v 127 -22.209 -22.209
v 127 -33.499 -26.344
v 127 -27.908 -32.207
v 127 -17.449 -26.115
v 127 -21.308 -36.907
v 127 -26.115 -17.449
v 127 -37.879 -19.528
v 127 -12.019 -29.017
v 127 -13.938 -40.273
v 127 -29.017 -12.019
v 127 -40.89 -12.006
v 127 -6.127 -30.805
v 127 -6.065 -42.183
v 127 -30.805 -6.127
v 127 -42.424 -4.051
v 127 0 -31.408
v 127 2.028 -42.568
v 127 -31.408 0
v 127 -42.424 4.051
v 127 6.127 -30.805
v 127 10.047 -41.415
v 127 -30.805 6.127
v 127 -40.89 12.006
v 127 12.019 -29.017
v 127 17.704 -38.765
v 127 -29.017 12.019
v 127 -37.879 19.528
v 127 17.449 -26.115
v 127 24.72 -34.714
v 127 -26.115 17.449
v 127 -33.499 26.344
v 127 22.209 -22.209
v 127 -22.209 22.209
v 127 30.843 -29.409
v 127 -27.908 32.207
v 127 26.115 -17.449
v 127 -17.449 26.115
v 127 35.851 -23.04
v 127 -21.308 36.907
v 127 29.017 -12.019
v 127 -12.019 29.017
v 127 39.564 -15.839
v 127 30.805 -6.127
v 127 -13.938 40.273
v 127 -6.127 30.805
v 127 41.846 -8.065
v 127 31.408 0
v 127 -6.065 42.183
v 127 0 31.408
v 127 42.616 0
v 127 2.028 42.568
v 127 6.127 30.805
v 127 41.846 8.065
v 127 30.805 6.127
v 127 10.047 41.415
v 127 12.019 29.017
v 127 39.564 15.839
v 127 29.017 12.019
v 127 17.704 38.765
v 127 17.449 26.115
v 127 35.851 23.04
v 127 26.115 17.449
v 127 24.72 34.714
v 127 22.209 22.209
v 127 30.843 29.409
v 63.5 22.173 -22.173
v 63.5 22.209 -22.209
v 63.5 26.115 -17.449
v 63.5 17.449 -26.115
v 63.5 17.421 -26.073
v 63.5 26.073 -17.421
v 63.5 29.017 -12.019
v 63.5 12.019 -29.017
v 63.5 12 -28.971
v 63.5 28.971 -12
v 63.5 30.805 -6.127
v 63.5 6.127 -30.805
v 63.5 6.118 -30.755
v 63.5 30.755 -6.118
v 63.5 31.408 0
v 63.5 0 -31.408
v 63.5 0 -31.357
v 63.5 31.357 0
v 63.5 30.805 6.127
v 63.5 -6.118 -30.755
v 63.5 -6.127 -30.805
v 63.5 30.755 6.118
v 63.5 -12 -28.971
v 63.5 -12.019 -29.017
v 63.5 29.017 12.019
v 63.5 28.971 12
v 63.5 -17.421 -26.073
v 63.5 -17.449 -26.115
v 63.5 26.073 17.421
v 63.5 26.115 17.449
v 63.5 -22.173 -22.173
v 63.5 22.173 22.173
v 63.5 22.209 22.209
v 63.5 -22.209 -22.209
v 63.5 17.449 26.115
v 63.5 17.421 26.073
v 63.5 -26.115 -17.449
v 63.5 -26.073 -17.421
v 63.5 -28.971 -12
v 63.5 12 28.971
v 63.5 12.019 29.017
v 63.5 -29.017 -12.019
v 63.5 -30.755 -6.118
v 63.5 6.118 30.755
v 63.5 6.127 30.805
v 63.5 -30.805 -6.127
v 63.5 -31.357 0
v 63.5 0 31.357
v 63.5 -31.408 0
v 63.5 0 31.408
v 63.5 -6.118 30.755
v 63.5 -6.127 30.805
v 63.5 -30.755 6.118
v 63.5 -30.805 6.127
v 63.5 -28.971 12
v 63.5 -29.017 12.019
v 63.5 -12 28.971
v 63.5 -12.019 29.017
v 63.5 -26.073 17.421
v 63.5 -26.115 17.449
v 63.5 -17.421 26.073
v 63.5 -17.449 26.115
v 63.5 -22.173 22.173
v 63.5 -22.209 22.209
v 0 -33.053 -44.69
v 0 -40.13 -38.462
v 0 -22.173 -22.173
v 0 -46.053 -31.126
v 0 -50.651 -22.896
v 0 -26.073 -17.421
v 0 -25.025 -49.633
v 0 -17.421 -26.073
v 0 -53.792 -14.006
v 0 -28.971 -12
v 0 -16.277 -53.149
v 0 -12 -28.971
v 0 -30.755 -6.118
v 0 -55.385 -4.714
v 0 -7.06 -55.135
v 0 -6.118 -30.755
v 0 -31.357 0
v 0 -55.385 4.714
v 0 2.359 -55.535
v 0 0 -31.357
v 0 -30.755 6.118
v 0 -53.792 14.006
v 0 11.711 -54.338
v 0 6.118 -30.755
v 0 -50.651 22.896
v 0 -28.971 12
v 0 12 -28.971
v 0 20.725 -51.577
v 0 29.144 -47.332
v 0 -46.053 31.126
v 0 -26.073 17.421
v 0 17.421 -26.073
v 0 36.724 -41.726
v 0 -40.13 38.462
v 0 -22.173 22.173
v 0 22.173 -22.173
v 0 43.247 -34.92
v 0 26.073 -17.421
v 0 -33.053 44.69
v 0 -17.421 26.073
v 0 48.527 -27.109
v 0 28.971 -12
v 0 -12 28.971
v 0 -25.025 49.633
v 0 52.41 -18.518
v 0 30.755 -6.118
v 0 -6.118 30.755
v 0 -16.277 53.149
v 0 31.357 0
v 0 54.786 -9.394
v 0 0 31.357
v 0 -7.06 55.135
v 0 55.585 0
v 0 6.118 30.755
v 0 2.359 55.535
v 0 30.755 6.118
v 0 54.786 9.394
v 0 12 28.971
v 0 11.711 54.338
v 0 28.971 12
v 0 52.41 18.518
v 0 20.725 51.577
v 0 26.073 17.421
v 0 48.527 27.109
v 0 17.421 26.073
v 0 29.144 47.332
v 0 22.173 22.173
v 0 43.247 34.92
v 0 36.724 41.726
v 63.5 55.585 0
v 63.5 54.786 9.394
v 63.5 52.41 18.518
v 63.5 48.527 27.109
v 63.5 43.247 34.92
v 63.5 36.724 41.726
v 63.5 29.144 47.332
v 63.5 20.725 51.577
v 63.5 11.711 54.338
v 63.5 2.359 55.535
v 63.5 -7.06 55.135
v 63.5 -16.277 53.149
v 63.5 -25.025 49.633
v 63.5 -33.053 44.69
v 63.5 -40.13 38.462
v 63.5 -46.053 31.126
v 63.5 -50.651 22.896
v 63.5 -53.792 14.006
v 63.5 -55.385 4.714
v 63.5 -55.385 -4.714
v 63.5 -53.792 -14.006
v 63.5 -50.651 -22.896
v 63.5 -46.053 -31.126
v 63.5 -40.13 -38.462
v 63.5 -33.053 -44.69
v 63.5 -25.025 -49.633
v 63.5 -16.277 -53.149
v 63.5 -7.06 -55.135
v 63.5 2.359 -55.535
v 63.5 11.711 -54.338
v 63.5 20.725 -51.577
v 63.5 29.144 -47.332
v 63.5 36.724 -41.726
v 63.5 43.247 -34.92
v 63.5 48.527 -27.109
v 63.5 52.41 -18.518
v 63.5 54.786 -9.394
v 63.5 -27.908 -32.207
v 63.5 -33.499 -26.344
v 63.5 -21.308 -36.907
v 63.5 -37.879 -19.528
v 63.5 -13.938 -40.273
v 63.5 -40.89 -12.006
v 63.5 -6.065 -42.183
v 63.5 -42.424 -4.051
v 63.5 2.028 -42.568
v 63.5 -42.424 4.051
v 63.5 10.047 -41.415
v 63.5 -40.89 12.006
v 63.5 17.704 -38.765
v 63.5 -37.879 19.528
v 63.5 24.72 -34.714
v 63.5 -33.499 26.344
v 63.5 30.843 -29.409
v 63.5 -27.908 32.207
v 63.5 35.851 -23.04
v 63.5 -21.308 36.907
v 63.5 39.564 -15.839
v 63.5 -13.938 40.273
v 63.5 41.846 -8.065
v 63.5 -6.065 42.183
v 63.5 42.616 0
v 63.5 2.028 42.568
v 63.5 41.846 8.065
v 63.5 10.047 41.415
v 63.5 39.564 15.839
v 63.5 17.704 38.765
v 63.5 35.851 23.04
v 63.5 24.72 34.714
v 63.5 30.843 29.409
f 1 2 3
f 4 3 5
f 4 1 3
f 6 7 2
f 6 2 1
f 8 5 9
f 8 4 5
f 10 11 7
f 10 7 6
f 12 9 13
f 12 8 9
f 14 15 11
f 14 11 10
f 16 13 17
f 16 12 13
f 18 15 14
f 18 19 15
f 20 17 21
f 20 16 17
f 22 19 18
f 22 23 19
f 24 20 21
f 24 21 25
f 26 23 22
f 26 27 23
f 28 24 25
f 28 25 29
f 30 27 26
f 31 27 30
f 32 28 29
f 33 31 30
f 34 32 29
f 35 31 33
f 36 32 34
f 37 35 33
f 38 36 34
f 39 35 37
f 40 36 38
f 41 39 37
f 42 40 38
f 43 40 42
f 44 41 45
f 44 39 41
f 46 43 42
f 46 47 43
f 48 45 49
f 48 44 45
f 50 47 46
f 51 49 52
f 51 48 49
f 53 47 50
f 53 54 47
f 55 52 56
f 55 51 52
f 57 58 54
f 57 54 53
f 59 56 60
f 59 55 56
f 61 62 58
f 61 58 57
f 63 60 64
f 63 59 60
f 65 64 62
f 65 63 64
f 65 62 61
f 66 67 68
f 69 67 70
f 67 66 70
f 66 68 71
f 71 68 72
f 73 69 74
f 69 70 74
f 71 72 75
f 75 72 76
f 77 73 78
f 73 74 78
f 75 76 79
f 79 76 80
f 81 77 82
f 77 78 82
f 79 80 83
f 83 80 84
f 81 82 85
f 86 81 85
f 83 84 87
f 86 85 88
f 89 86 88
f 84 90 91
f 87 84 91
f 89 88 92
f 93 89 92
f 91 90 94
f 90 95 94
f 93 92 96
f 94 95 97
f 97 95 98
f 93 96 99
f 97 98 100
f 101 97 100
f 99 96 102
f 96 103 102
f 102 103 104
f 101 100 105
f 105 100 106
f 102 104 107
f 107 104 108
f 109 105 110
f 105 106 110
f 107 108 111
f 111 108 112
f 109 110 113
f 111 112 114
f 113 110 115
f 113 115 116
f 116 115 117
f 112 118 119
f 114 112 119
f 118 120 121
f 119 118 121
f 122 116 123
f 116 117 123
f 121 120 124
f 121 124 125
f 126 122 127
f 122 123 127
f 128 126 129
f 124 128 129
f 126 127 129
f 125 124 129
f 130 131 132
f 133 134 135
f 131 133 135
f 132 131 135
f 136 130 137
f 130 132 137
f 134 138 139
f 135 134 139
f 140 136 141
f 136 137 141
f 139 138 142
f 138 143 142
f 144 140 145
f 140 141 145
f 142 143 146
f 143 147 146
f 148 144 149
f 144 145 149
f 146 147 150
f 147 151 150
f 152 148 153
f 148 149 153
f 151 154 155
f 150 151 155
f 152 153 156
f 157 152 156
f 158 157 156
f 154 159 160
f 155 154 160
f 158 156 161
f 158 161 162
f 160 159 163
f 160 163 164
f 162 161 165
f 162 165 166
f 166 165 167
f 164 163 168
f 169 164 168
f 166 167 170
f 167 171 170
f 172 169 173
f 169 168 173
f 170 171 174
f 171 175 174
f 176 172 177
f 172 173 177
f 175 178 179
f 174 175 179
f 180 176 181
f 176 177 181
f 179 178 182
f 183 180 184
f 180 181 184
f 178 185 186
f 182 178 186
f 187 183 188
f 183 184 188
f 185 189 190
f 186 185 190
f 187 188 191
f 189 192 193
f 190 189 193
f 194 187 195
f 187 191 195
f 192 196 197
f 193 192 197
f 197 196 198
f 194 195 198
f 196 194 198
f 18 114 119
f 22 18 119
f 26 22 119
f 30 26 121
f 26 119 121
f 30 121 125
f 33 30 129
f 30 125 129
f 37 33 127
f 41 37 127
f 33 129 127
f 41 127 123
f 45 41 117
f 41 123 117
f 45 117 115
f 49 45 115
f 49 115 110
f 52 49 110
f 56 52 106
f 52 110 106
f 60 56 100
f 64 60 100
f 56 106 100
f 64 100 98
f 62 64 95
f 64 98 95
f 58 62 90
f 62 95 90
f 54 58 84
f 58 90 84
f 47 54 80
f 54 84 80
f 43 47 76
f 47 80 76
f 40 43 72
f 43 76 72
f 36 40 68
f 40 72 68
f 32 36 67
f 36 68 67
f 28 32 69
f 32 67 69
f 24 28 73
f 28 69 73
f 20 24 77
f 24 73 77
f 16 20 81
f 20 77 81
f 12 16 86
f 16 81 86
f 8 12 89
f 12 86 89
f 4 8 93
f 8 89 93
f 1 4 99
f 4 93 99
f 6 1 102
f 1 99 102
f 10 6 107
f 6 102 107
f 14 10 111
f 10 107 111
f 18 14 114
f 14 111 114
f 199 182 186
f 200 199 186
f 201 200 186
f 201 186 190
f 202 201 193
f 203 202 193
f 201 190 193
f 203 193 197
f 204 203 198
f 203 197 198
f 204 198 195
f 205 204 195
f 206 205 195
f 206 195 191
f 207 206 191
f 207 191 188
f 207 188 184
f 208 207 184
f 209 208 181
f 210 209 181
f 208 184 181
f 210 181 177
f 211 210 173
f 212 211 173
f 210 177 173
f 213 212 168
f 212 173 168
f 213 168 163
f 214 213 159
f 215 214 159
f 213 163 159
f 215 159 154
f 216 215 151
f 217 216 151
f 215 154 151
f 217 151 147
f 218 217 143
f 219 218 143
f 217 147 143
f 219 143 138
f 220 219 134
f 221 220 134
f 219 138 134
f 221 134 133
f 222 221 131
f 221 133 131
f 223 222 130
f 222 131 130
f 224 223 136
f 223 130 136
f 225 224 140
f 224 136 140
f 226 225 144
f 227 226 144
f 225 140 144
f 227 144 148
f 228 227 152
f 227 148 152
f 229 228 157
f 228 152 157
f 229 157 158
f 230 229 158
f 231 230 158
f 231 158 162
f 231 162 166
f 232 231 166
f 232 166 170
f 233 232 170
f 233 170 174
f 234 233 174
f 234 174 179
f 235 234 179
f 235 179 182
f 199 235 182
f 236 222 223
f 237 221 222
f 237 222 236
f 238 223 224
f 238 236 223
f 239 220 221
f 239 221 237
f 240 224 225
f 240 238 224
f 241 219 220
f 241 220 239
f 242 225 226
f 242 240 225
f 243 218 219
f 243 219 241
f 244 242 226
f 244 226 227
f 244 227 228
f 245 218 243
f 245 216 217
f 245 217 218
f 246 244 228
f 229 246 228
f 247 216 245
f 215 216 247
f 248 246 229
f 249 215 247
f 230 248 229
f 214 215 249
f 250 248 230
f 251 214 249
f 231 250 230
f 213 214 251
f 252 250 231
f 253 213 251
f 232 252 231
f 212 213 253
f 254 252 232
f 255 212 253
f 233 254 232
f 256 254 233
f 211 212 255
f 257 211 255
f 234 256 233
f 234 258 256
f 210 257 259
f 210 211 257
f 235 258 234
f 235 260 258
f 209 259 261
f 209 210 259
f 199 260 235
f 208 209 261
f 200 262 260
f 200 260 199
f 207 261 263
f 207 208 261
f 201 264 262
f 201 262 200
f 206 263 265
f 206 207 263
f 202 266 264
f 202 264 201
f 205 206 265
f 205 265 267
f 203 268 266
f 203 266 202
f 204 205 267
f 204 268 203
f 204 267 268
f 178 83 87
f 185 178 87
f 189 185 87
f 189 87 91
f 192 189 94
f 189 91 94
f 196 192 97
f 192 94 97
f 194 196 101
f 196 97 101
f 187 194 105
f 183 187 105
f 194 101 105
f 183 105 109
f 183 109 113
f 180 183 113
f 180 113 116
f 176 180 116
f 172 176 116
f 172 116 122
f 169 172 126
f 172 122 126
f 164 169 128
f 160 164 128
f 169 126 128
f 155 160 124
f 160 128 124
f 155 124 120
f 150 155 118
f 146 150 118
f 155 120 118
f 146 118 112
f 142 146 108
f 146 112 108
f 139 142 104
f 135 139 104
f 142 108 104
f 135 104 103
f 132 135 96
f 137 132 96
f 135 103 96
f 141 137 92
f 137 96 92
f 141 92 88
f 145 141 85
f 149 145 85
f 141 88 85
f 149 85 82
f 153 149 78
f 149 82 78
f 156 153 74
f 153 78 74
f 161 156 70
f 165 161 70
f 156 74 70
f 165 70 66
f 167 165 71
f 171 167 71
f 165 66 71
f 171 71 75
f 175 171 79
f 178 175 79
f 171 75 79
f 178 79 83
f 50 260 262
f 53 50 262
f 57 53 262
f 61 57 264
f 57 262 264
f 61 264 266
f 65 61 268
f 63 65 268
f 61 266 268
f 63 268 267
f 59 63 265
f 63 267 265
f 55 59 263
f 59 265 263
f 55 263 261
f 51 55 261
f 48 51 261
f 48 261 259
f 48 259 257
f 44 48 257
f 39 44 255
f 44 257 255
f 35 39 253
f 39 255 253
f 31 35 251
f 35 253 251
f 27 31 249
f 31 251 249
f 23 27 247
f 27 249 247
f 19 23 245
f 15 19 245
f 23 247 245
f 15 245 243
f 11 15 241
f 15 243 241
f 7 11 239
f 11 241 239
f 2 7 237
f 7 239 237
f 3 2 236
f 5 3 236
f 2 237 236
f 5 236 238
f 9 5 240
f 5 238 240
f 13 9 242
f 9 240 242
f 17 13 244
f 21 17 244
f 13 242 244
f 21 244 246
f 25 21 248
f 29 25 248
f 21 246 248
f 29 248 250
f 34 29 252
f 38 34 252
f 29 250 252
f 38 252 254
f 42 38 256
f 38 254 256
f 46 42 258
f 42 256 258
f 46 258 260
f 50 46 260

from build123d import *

# Parameters (mm, degrees)
F0_R     = 55.585182
F1_DEPTH = 63.5
F2_R     = 31.357467
F3_DEPTH = 63.5
F4_R     = 42.616489
F5_DEPTH = 63.5
F6_R     = 31.408113
F7_DEPTH = 63.5


with BuildPart() as f1:
    # F0 (on Right) → F1 (new body)
    with BuildSketch(Plane.YZ):
        Circle(F0_R)
    extrude(amount=F1_DEPTH)

    # F2 (on face) → F3 (cut)
    with BuildSketch(Plane.YZ.offset(63.5)):
        Circle(F2_R)
    extrude(amount=-F3_DEPTH, mode=Mode.SUBTRACT)

    # F4 (on face) → F5 (join)
    with BuildSketch(Plane.YZ.offset(63.5)):
        Circle(F4_R)
    extrude(amount=F5_DEPTH)

    # F6 (on face) → F7 (cut)
    with BuildSketch(Plane(origin=(63.5, 0, 0), x_dir=(0, -1, 0), z_dir=(-1, 0, 0))):
        Circle(F6_R)
    extrude(amount=-F7_DEPTH, mode=Mode.SUBTRACT)


solid = f1.part
